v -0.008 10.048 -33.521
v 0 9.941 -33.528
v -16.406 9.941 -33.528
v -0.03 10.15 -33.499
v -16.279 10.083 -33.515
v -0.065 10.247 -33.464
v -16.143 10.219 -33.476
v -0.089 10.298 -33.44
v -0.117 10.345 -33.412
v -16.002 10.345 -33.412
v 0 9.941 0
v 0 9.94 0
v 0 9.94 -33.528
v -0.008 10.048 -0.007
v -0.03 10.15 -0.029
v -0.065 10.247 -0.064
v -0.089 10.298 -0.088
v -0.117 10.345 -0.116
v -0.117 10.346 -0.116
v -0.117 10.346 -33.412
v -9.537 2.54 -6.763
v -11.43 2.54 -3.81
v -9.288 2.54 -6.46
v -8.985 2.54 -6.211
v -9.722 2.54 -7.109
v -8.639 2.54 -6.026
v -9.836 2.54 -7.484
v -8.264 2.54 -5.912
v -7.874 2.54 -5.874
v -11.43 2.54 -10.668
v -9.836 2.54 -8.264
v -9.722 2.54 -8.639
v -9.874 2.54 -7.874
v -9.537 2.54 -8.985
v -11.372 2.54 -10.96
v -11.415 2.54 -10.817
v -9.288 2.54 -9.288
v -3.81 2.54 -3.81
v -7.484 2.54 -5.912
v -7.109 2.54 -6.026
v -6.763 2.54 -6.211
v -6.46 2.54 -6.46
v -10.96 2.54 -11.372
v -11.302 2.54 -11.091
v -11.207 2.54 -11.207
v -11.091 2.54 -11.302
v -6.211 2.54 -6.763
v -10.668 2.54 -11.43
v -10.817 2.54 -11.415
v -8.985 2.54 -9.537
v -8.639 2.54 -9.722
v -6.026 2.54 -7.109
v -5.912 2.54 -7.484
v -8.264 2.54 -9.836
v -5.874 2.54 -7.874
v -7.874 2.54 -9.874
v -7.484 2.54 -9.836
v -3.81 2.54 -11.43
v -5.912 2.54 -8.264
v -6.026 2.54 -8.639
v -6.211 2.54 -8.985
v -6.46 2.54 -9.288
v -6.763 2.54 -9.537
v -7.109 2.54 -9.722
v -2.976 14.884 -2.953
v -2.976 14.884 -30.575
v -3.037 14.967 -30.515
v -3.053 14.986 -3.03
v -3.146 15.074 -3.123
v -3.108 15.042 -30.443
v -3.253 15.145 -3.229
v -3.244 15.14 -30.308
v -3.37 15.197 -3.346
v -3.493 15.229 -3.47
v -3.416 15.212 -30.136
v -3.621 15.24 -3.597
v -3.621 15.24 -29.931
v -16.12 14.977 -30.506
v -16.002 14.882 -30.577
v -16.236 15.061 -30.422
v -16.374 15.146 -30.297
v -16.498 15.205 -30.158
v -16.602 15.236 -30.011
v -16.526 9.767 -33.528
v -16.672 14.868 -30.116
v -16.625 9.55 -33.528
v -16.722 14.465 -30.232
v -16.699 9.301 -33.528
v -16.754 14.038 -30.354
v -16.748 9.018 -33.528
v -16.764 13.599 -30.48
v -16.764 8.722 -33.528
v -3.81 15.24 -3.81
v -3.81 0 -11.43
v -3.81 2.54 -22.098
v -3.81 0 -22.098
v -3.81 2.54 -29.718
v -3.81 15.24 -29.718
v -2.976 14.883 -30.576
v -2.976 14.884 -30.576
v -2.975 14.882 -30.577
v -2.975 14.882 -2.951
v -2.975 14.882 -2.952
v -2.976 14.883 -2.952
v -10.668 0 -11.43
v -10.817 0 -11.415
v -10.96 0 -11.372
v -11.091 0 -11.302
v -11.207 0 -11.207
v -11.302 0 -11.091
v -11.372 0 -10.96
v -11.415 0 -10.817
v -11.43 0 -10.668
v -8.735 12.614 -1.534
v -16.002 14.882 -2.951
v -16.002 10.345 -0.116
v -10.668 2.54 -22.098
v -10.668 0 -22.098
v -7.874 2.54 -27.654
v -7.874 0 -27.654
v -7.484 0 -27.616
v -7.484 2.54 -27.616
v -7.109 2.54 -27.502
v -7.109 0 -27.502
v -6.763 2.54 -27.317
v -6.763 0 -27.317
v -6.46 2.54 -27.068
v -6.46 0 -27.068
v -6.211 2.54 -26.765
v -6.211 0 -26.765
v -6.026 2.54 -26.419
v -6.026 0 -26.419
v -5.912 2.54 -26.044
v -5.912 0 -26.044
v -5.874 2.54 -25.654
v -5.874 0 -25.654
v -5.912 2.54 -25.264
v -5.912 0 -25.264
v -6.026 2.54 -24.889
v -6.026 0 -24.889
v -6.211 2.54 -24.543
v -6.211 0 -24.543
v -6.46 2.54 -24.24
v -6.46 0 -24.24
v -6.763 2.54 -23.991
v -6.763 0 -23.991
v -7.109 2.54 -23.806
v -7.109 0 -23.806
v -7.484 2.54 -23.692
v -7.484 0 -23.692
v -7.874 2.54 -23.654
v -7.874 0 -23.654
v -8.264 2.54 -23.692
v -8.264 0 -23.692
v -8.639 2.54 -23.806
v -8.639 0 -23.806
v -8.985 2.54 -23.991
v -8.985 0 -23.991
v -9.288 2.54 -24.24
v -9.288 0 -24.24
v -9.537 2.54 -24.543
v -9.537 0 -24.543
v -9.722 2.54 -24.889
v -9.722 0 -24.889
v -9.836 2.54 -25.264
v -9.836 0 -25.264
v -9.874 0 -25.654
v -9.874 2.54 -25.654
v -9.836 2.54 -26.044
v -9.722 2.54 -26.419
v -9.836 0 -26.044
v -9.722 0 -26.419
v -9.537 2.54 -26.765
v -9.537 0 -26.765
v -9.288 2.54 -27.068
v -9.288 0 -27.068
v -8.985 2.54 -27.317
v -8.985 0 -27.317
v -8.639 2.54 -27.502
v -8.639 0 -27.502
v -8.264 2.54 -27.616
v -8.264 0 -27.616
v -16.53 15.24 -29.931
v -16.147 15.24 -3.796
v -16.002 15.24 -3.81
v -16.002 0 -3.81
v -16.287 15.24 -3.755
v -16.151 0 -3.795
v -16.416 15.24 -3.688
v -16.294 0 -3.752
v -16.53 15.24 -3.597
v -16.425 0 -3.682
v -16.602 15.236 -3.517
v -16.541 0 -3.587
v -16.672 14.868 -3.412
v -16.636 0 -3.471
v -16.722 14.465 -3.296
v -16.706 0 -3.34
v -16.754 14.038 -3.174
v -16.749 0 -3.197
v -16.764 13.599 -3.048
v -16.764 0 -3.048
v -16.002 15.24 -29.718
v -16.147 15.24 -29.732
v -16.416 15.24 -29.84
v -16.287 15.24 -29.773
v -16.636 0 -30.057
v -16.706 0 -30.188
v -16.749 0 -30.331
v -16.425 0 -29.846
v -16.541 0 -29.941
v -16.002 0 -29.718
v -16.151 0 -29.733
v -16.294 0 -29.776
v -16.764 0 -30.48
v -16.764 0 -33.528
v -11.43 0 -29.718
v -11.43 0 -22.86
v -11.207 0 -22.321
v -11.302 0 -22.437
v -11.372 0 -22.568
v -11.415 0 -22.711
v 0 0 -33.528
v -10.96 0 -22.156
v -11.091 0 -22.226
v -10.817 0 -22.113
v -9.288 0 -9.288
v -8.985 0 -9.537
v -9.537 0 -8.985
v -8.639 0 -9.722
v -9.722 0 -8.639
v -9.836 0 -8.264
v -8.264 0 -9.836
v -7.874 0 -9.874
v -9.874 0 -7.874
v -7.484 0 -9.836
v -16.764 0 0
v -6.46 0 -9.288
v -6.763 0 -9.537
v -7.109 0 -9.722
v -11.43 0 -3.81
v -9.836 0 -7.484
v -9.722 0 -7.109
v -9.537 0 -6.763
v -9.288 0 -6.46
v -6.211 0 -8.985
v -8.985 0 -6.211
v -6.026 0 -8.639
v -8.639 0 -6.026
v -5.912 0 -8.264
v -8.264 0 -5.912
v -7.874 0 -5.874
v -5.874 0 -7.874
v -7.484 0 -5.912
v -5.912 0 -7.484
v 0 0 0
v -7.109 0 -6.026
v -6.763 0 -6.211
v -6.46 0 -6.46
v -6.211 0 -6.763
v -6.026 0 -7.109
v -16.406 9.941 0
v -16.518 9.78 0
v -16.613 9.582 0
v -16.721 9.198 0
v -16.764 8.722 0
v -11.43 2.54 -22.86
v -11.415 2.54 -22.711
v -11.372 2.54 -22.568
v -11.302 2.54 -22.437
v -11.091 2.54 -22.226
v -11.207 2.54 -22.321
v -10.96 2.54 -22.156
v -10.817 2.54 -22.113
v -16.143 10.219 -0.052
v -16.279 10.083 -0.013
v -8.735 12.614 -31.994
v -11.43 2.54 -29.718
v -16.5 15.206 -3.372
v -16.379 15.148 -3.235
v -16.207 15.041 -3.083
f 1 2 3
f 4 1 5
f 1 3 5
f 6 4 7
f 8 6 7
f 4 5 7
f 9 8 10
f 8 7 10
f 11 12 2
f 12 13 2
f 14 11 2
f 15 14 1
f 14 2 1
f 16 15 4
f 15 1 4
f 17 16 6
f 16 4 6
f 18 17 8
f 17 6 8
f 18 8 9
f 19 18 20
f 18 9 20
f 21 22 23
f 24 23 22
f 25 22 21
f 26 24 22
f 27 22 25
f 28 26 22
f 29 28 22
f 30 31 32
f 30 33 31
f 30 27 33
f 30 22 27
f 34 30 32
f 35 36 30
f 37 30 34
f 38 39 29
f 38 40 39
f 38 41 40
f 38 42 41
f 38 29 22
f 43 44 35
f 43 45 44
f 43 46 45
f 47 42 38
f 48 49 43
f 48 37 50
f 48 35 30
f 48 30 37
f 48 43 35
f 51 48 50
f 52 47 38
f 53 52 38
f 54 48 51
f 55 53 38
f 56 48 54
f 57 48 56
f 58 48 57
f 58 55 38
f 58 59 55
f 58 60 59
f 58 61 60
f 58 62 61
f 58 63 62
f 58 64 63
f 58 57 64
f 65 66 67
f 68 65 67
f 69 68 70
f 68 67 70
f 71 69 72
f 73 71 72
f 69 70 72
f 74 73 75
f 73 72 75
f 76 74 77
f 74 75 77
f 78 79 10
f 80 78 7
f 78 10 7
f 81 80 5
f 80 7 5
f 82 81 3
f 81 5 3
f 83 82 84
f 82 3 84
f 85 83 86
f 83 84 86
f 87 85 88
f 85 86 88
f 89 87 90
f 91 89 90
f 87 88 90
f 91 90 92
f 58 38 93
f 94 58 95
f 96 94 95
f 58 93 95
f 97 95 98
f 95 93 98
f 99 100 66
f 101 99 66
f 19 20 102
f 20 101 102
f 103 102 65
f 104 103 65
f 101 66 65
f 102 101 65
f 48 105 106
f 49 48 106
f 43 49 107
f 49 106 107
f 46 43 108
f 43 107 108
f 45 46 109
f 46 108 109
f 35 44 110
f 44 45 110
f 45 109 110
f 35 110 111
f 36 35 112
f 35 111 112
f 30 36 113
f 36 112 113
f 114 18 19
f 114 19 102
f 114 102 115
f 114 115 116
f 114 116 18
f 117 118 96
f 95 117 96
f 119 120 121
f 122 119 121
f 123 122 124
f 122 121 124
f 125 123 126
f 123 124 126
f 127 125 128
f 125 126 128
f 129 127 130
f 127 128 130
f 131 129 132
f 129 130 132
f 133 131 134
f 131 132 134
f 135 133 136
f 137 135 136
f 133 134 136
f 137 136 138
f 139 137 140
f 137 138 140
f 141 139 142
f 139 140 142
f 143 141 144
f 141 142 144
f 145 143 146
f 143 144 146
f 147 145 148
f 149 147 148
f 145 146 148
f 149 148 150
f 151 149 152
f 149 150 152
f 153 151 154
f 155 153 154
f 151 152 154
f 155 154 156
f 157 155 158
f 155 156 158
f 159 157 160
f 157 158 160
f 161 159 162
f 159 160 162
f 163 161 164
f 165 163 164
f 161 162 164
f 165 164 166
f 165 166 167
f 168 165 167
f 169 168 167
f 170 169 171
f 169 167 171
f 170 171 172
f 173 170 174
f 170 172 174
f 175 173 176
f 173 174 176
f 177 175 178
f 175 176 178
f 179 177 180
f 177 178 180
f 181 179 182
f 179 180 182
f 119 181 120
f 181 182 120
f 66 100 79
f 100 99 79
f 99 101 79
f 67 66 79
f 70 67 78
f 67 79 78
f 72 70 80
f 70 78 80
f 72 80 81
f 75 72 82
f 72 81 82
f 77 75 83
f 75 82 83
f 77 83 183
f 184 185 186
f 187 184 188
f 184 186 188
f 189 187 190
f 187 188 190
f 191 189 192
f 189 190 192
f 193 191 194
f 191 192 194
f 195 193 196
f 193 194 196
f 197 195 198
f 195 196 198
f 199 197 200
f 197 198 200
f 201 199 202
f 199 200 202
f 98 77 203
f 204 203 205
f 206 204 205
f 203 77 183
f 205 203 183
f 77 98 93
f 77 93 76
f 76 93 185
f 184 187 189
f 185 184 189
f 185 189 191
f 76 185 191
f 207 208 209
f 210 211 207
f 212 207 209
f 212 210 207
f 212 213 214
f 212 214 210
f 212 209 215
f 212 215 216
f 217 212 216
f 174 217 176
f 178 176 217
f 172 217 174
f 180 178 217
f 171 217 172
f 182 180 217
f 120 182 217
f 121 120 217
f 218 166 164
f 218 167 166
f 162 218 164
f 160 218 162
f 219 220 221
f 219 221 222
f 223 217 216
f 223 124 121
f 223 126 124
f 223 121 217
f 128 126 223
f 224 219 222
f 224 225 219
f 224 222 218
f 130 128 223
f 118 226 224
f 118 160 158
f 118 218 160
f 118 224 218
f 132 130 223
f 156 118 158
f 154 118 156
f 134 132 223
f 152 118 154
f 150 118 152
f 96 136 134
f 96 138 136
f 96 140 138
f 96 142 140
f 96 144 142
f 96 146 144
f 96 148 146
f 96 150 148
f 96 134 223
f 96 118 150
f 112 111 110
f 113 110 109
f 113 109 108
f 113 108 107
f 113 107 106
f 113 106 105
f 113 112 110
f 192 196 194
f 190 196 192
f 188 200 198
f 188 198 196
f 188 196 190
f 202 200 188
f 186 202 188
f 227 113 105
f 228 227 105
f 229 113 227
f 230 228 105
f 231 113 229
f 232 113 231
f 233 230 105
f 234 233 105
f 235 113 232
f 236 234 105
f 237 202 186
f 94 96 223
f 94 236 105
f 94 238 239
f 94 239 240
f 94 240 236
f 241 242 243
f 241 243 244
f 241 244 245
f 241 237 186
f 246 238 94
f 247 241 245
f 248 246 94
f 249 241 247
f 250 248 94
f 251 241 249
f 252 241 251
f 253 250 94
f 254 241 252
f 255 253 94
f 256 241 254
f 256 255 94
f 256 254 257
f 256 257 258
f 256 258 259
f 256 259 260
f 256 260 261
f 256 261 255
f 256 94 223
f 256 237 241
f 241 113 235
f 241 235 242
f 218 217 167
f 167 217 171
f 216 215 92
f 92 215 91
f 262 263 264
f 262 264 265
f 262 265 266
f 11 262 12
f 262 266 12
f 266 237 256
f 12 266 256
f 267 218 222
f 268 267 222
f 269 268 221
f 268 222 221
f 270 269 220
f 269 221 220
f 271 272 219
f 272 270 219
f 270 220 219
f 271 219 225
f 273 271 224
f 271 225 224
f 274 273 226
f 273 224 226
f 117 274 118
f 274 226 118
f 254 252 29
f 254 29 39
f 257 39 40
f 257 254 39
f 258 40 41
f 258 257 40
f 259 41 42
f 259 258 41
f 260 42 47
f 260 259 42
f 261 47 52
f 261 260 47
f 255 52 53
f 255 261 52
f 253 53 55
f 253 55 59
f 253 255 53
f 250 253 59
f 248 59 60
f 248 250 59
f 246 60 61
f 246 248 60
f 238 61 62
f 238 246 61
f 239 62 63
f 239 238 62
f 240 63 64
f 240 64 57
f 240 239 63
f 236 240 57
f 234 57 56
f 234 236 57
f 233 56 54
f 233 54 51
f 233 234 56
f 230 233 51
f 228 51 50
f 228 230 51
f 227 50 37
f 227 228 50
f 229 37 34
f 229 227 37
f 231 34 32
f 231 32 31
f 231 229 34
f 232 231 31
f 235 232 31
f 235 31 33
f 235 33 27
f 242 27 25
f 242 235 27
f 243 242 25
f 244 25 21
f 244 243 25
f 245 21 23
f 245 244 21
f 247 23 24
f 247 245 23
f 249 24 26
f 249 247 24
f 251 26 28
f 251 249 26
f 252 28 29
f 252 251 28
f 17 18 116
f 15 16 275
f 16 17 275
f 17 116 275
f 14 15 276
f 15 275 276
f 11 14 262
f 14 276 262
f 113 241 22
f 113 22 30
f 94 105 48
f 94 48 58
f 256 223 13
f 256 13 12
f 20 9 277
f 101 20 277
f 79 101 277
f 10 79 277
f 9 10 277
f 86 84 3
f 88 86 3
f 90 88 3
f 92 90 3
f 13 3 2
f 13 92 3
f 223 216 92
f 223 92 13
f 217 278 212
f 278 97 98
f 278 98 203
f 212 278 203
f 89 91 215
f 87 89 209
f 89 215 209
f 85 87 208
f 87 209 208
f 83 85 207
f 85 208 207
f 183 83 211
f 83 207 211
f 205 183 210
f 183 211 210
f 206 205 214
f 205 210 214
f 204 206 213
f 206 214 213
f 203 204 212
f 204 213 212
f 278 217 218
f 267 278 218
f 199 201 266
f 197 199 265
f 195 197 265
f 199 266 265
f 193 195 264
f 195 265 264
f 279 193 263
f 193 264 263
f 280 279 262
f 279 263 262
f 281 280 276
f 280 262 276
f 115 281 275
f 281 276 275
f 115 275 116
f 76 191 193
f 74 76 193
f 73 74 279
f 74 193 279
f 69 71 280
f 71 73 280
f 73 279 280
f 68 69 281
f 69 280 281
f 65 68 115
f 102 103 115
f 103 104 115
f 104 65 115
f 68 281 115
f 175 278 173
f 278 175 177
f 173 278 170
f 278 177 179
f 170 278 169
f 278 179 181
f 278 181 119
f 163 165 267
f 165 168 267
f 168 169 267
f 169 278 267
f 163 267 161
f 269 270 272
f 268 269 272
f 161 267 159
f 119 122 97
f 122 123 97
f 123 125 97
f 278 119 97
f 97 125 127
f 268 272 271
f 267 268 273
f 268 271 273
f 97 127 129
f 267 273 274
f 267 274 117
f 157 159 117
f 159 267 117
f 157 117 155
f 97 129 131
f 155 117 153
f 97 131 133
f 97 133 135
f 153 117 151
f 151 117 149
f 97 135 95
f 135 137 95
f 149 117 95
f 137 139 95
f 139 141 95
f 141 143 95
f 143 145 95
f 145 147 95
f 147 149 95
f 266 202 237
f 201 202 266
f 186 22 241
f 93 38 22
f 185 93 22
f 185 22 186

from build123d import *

# Parameters (mm, degrees)
BOSS_EXTRUDE1_DEPTH = 10.16
SKETCH2_W           = 11.43
SKETCH2_H           = 11.43
SKETCH2_R           = 2
BOSS_EXTRUDE2_DEPTH = 2.54
FILLET2_R           = 0.762


with BuildPart() as part:
    # Sketch1 → Boss-Extrude1 (new body)
    with BuildSketch(Plane(origin=(0, 0, 0), x_dir=(1, 0, 0), z_dir=(0, 1, 0))):
        Polygon((0, 0), (0, 16.764), (-3.81, 16.764), (-3.81, 3.81), (-16.764, 3.81), (-16.764, 0), align=None)
    extrude(amount=BOSS_EXTRUDE1_DEPTH)

    # Sketch2 → Boss-Extrude2 (add)
    with BuildSketch(Plane(origin=(0, 0, 0), x_dir=(1, 0, 0), z_dir=(0, 1, 0))):
        with Locations((-5.715, 5.715)):
            Rectangle(SKETCH2_W, SKETCH2_H)
        with Locations(Location((-7.874, 7.874, 0), (0, 0, 270))):
            Circle(SKETCH2_R, mode=Mode.SUBTRACT)
    extrude(amount=BOSS_EXTRUDE2_DEPTH)

    # Sketch3 → section 1 of loft3
    with BuildSketch(Plane(origin=(0, 15.24, 0), x_dir=(1, 0, 0), z_dir=(0, 1, 0)), mode=Mode.PRIVATE) as loft3_s1:
        with BuildLine():
            Line((-3.2004, 3.175), (-3.2004, 16.764))
            Line((-3.2004, 16.764), (-3.81, 16.764))
            Line((-3.81, 16.764), (-3.81, 3.81))
            Line((-3.81, 3.81), (-16.764, 3.81))
            Line((-16.764, 3.81), (-16.764, 3.175))
            Line((-16.764, 3.175), (-3.2004, 3.175))
        make_face()
    # loft from a face of the part (loft3)
    loft([part.faces().sort_by_distance((-0.237078762, 10.16, -8.382))[0], loft3_s1.sketch])

    # Mirror4: part across plane


with BuildPart() as part_1:
    add(part.part)
    add(part.part.mirror(Plane(origin=(0, 10.16, -16.764), x_dir=(1, 0, 0), z_dir=(0, 0, 1))))

    # Fillet2
    # the kernel refuses this fillet: 0.762 mm, written as the material it takes off along each edge
    with BuildSketch(Plane(origin=(-16.764, -1.905, -3.81), x_dir=(0, 0, 1), z_dir=(0, 1, 0)), Plane(origin=(-16.764, -1.905, -29.718), x_dir=(1, 0, 0), z_dir=(0, 1, 0))) as fillet2_piece_1:
        with BuildLine():
            CenterArc((FILLET2_R, FILLET2_R), FILLET2_R, 180, 90)
            Line((0, FILLET2_R), (0, 0))
            Line((0, 0), (FILLET2_R, 0))
        make_face()
    extrude(amount=19.05, mode=Mode.SUBTRACT)
    with BuildSketch(Plane(origin=(-11.43, -1.905, -11.43), x_dir=(0, 0, 1), z_dir=(0, 1, 0))) as fillet2_piece_2:
        with BuildLine():
            CenterArc((FILLET2_R, FILLET2_R), FILLET2_R, 180, 90)
            Line((0, FILLET2_R), (0, 0))
            Line((0, 0), (FILLET2_R, 0))
        make_face()
    extrude(amount=6.35, mode=Mode.SUBTRACT)
    with BuildSketch(Plane(origin=(-17.819841757, 15.24, -3.175), x_dir=(0, 0, -1), z_dir=(1, 0, 0)), Plane(origin=(-17.819841757, 15.24, -30.353), x_dir=(0, -0.8479983040050892, -0.5299989400031782), z_dir=(1, 0, 0))) as fillet2_piece_3:
        with BuildLine():
            CenterArc((FILLET2_R * 0.554247641507, -FILLET2_R), FILLET2_R, 90, 57.994616792)
            Line((-FILLET2_R * 0.293750662498, -FILLET2_R * 0.470001059997), (0, 0))
            Line((0, 0), (FILLET2_R * 0.554247641507, 0))
        make_face()
    extrude(amount=15.675283514, mode=Mode.SUBTRACT)
    with BuildSketch(Plane(origin=(-3.2004, 15.24, -31.404379485), x_dir=(-1, 0, 0), z_dir=(0, 0, 1))) as fillet2_piece_4:
        with BuildLine():
            CenterArc((FILLET2_R * 0.551905241549, FILLET2_R), FILLET2_R, 212.210927724, 57.789072276)
            Line((-FILLET2_R * 0.29418627649, FILLET2_R * 0.466962343635), (0, 0))
            Line((0, 0), (FILLET2_R * 0.551905241549, 0))
        make_face()
    extrude(amount=29.28075897, mode=Mode.SUBTRACT)
    with BuildSketch(Plane(origin=(-16.764, 8.544563231, 1.009647981), x_dir=(1, 0, 0), z_dir=(0, 0.847998304005088, -0.5299989400031799))) as fillet2_piece_5:
        with BuildLine():
            CenterArc((FILLET2_R, FILLET2_R), FILLET2_R, 180, 90)
            Line((0, FILLET2_R), (0, 0))
            Line((0, 0), (FILLET2_R, 0))
        make_face()
    extrude(amount=9.800578019, mode=Mode.SUBTRACT)
    with BuildSketch(Plane(origin=(-17.310346811, 10.16, 0), x_dir=(0, 0.8479983040050875, -0.5299989400031807), z_dir=(1, 0, 0)), Plane(origin=(-17.310346811, 10.16, -33.528), x_dir=(0, -1, 0), z_dir=(1, 0, 0))) as fillet2_piece_6:
        with BuildLine():
            CenterArc((FILLET2_R * 0.286796226411, -FILLET2_R), FILLET2_R, 90, 32.005383208)
            Line((-FILLET2_R * 0.243202713592, -FILLET2_R * 0.152001695995), (0, 0))
            Line((0, 0), (FILLET2_R * 0.286796226411, 0))
        make_face()
    extrude(amount=17.856693623, mode=Mode.SUBTRACT)
    with BuildSketch(Plane(origin=(-11.43, -1.905, -22.098), x_dir=(0, 0, -1), z_dir=(0, 1, 0))) as fillet2_piece_7:
        with BuildLine():
            CenterArc((FILLET2_R, -FILLET2_R), FILLET2_R, 90, 90)
            Line((0, -FILLET2_R), (0, 0))
            Line((0, 0), (FILLET2_R, 0))
        make_face()
    extrude(amount=6.35, mode=Mode.SUBTRACT)
    with BuildSketch(Plane(origin=(-16.764, 8.544563231, -34.537647981), x_dir=(1, 0, 0), z_dir=(0, 0.847998304005088, 0.5299989400031797))) as fillet2_piece_8:
        with BuildLine():
            CenterArc((FILLET2_R, -FILLET2_R), FILLET2_R, 90, 90)
            Line((0, -FILLET2_R), (0, 0))
            Line((0, 0), (FILLET2_R, 0))
        make_face()
    extrude(amount=9.800578019, mode=Mode.SUBTRACT)
    with BuildSketch(Plane(origin=(0, 10.16, -34.078046802), x_dir=(0, -1, 0), z_dir=(0, 0, 1))) as fillet2_piece_9:
        with BuildLine():
            CenterArc((FILLET2_R * 0.288738478649, -FILLET2_R), FILLET2_R, 90, 32.210927724)
            Line((-FILLET2_R * 0.244299177716, -FILLET2_R * 0.153908481961), (0, 0))
            Line((0, 0), (FILLET2_R * 0.288738478649, 0))
        make_face()
    extrude(amount=34.628093604, mode=Mode.SUBTRACT)


solid = part_1.part
